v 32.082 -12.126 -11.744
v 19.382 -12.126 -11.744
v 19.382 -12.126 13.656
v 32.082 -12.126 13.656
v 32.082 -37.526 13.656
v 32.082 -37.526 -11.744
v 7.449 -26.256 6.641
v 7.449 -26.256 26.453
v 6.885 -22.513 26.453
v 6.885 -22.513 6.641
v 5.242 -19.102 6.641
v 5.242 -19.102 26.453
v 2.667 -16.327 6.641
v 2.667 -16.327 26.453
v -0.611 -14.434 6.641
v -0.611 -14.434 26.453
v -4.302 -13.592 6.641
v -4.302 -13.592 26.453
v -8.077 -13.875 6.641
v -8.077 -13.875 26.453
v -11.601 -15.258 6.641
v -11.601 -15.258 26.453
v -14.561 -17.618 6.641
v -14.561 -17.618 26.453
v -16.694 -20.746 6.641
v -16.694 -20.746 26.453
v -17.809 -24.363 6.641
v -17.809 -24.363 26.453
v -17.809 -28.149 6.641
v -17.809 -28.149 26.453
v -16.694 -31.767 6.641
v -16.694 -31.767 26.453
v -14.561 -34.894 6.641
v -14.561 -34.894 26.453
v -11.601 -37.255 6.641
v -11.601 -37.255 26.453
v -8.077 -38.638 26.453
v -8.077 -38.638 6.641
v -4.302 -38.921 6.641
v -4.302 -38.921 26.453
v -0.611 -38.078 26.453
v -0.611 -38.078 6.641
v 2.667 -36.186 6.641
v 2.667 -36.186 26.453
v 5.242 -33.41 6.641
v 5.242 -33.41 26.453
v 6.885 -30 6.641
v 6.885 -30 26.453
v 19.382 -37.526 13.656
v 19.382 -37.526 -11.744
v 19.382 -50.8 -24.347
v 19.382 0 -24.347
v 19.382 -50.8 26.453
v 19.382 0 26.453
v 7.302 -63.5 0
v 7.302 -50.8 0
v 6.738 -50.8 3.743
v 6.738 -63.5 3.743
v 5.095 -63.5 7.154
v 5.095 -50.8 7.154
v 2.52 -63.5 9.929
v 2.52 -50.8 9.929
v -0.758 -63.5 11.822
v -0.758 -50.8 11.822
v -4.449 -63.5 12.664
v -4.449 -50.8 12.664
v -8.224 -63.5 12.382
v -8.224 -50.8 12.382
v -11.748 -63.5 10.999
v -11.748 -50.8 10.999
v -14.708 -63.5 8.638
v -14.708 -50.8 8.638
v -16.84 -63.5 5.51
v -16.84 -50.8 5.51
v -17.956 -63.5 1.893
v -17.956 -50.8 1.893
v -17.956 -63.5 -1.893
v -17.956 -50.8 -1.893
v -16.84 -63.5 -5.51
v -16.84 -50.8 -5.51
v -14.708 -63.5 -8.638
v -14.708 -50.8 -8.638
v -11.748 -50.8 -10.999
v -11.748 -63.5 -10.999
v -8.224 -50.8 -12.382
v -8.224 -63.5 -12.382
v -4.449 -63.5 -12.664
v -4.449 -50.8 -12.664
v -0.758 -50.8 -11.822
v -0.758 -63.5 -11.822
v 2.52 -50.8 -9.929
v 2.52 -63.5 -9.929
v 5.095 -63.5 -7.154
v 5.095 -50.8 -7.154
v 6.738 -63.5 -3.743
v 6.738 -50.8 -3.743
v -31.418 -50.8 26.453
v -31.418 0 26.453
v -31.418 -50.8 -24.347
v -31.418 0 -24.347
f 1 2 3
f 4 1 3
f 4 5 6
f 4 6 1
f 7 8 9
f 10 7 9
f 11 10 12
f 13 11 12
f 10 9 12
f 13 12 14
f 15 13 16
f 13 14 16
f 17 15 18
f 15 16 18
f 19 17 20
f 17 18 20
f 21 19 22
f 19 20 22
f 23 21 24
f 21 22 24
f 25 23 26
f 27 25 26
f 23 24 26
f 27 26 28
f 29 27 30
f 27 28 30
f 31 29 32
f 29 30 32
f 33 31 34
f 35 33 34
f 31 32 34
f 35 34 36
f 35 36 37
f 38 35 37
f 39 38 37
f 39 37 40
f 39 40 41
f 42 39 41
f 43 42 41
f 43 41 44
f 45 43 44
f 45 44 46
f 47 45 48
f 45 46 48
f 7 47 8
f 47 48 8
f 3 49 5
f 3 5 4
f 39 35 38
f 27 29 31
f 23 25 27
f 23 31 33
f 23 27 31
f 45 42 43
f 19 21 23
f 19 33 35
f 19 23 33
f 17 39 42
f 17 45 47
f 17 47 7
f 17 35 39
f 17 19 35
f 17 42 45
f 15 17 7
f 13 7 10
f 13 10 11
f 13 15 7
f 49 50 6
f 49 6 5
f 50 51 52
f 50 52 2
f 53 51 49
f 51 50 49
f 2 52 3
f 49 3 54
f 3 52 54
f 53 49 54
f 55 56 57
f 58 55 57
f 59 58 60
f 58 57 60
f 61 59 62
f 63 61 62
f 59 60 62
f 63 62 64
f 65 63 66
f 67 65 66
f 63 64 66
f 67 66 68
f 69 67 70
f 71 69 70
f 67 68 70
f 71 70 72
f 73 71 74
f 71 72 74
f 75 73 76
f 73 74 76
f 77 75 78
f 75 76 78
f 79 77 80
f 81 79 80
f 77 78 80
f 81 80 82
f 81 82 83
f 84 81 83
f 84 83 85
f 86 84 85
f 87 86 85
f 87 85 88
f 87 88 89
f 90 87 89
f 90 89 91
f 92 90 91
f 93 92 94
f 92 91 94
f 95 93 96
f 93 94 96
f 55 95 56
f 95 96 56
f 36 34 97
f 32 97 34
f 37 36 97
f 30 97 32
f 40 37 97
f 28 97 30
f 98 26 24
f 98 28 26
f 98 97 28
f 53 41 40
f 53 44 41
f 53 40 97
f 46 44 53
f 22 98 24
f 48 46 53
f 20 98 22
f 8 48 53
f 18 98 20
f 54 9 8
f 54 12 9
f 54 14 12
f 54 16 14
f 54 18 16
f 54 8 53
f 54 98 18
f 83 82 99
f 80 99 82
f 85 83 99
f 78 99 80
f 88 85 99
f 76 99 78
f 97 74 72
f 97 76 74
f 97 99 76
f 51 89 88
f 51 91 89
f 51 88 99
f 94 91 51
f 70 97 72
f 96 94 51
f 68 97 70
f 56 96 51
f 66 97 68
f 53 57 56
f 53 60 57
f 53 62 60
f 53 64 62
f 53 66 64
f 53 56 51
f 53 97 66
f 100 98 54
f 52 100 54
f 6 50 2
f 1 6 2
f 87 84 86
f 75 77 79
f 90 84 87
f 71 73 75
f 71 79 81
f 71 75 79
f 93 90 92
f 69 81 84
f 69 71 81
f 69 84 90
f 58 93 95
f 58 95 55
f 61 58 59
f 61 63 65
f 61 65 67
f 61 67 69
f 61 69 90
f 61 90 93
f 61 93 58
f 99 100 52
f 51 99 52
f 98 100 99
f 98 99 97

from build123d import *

# Parameters (mm, degrees)
F0_W     = 50.8
F0_H     = 50.8
F1_DEPTH = 50.8
F2_R     = 12.7
F3_DEPTH = 12.7
F4_W     = 25.4
F4_H     = 25.4
F5_DEPTH = 12.7
F6_R     = 12.7
F7_DEPTH = 19.812


with BuildPart() as f1:
    # F0 (on Front) → F1 (new body)
    with BuildSketch(Plane.XZ):
        with Locations((-6.018102, 1.05328)):
            Rectangle(F0_W, F0_H)
    extrude(amount=F1_DEPTH)

    # F2 (on face) → F3 (join)
    with BuildSketch(Plane.XZ.offset(50.8)):
        with Locations((-5.397914, 0)):
            Circle(F2_R)
    extrude(amount=F3_DEPTH)

    # F4 (on face) → F5 (join)
    with BuildSketch(Plane.YZ.offset(19.381898)):
        with Locations((-24.825621, 0.956289)):
            Rectangle(F4_W, F4_H)
    extrude(amount=F5_DEPTH)

    # F6 (on face) → F7 (cut)
    with BuildSketch(Plane.XY.offset(26.45328)):
        with Locations((-5.251253, -26.256265)):
            Circle(F6_R)
    extrude(amount=-F7_DEPTH, mode=Mode.SUBTRACT)


solid = f1.part
